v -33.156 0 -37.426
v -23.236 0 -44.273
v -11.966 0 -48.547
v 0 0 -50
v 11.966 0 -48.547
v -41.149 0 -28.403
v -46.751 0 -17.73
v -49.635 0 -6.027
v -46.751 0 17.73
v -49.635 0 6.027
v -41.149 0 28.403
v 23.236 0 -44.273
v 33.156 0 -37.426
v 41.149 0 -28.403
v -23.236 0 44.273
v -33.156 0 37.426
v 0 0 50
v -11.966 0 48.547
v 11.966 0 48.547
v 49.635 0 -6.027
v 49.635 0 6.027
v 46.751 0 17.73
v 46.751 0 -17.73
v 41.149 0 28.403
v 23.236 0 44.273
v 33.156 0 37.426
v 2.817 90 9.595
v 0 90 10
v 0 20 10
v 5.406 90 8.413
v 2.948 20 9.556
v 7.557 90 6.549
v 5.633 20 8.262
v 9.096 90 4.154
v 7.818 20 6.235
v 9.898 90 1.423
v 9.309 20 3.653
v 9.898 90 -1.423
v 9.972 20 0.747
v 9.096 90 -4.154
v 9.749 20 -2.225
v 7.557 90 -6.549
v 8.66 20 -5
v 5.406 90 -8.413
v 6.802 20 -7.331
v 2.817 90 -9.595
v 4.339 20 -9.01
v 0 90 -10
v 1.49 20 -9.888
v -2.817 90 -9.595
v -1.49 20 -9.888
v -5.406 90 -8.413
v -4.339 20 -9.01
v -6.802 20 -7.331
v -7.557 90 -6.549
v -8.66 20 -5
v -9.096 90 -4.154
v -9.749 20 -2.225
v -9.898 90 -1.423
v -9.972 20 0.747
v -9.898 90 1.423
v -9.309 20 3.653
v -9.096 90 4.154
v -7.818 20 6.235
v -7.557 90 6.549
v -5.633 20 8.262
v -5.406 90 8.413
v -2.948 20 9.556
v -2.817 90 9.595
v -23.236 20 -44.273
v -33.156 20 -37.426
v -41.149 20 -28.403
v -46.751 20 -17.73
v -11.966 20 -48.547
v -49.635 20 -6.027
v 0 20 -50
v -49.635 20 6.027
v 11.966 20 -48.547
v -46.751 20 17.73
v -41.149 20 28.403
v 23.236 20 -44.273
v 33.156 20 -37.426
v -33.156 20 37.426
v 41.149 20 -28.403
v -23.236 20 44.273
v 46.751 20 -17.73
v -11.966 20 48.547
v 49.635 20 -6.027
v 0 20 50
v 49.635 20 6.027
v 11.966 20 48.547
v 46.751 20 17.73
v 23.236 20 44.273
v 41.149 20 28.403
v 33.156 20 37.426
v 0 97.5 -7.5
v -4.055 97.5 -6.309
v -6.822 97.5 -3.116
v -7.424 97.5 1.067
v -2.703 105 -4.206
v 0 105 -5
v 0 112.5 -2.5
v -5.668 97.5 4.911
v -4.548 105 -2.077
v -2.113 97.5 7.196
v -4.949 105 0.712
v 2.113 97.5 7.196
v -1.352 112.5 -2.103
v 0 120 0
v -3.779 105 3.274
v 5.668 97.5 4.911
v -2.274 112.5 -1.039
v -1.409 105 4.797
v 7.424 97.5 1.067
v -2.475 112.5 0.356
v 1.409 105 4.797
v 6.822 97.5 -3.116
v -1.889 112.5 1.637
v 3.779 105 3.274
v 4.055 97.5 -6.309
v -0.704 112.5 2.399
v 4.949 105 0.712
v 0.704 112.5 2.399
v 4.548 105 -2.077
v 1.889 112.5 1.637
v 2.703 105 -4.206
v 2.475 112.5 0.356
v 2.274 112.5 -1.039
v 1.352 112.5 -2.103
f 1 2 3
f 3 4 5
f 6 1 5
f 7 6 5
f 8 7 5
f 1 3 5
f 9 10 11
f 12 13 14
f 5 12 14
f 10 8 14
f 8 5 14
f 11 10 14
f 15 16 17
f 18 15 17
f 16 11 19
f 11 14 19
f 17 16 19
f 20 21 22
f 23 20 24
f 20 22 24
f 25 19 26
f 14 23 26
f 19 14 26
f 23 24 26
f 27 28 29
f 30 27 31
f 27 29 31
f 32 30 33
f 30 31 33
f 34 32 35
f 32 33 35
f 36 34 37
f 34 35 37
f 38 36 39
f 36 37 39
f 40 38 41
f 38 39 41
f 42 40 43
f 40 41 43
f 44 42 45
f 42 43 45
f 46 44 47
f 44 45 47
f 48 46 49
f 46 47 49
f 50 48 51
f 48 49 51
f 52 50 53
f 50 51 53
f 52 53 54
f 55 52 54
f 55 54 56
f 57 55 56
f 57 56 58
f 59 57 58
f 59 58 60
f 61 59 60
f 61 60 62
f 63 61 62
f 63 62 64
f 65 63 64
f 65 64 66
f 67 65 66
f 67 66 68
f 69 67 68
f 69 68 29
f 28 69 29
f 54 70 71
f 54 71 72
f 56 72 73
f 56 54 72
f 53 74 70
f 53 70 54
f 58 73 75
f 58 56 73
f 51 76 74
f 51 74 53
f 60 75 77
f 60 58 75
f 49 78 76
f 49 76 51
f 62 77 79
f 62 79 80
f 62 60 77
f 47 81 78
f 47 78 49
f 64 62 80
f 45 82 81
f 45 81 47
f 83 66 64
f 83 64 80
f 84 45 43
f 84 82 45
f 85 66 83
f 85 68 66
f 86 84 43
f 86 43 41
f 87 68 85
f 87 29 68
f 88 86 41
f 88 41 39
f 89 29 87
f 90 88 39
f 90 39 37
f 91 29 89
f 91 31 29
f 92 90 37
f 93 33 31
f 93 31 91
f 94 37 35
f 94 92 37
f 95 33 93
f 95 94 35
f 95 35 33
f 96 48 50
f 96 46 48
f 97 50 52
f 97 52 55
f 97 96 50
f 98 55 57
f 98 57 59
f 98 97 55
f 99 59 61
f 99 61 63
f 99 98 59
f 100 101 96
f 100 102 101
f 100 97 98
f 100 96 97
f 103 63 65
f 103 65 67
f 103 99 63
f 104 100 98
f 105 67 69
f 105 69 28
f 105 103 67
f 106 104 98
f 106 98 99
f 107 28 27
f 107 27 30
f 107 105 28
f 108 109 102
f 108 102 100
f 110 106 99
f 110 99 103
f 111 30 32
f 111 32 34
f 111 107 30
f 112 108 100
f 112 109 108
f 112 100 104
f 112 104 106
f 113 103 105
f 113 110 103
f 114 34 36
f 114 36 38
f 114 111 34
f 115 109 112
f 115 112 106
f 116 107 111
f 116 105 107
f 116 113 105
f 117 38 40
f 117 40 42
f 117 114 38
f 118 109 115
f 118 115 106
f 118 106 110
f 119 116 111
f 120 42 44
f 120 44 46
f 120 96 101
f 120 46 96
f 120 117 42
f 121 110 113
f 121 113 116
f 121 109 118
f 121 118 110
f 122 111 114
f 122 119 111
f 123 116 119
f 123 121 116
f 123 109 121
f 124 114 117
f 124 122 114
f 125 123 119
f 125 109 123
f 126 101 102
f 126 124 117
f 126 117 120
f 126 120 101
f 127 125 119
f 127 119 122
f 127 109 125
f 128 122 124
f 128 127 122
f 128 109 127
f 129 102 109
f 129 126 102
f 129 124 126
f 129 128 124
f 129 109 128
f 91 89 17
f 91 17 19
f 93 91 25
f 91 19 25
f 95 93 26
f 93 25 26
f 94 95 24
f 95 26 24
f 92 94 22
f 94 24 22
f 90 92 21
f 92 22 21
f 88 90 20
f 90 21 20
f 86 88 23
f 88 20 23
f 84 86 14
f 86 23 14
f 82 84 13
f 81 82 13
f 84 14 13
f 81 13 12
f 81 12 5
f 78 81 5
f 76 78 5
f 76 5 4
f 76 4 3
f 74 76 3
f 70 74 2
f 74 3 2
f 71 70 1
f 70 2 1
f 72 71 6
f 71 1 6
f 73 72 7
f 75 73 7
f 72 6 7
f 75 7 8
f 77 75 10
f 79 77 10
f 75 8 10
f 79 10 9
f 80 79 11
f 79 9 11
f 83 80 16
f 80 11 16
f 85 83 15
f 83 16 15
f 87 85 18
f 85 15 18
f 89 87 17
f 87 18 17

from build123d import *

# Parameters (mm, degrees)
SKETCH_2_R      = 50
EXTRUDE_1_DEPTH = 20
SKETCH_3_R      = 10
EXTRUDE_2_DEPTH = 70


with BuildPart() as part:
    # 草图2 → 凸台-拉伸1 (new body)
    with BuildSketch(Plane(origin=(0, 0, 0), x_dir=(1, 0, 0), z_dir=(0, 1, 0))):
        with Locations(Location((0, 0, 0), (0, 0, 270))):
            Circle(SKETCH_2_R)
    extrude(amount=EXTRUDE_1_DEPTH)

    # 草图3 → 凸台-拉伸2 (add)
    with BuildSketch(Plane(origin=(0, 20, 0), x_dir=(1, 0, 0), z_dir=(0, 1, 0))):
        with Locations(Location((0, 0, 0), (0, 0, 270))):
            Circle(SKETCH_3_R)
    extrude(amount=EXTRUDE_2_DEPTH)

    # 草图4 → 旋转1 (revolve)
    with BuildSketch(Plane.XY, mode=Mode.PRIVATE) as revolve_1_sk:
        Polygon((0, 90), (10, 90), (0, 120), align=None)
    revolve(revolve_1_sk.sketch.rotate(Axis((0, 0, 0), (0, 1, 0)), 90), axis=Axis((0, 0, 0), (0, 1, 0)))


solid = part.part
